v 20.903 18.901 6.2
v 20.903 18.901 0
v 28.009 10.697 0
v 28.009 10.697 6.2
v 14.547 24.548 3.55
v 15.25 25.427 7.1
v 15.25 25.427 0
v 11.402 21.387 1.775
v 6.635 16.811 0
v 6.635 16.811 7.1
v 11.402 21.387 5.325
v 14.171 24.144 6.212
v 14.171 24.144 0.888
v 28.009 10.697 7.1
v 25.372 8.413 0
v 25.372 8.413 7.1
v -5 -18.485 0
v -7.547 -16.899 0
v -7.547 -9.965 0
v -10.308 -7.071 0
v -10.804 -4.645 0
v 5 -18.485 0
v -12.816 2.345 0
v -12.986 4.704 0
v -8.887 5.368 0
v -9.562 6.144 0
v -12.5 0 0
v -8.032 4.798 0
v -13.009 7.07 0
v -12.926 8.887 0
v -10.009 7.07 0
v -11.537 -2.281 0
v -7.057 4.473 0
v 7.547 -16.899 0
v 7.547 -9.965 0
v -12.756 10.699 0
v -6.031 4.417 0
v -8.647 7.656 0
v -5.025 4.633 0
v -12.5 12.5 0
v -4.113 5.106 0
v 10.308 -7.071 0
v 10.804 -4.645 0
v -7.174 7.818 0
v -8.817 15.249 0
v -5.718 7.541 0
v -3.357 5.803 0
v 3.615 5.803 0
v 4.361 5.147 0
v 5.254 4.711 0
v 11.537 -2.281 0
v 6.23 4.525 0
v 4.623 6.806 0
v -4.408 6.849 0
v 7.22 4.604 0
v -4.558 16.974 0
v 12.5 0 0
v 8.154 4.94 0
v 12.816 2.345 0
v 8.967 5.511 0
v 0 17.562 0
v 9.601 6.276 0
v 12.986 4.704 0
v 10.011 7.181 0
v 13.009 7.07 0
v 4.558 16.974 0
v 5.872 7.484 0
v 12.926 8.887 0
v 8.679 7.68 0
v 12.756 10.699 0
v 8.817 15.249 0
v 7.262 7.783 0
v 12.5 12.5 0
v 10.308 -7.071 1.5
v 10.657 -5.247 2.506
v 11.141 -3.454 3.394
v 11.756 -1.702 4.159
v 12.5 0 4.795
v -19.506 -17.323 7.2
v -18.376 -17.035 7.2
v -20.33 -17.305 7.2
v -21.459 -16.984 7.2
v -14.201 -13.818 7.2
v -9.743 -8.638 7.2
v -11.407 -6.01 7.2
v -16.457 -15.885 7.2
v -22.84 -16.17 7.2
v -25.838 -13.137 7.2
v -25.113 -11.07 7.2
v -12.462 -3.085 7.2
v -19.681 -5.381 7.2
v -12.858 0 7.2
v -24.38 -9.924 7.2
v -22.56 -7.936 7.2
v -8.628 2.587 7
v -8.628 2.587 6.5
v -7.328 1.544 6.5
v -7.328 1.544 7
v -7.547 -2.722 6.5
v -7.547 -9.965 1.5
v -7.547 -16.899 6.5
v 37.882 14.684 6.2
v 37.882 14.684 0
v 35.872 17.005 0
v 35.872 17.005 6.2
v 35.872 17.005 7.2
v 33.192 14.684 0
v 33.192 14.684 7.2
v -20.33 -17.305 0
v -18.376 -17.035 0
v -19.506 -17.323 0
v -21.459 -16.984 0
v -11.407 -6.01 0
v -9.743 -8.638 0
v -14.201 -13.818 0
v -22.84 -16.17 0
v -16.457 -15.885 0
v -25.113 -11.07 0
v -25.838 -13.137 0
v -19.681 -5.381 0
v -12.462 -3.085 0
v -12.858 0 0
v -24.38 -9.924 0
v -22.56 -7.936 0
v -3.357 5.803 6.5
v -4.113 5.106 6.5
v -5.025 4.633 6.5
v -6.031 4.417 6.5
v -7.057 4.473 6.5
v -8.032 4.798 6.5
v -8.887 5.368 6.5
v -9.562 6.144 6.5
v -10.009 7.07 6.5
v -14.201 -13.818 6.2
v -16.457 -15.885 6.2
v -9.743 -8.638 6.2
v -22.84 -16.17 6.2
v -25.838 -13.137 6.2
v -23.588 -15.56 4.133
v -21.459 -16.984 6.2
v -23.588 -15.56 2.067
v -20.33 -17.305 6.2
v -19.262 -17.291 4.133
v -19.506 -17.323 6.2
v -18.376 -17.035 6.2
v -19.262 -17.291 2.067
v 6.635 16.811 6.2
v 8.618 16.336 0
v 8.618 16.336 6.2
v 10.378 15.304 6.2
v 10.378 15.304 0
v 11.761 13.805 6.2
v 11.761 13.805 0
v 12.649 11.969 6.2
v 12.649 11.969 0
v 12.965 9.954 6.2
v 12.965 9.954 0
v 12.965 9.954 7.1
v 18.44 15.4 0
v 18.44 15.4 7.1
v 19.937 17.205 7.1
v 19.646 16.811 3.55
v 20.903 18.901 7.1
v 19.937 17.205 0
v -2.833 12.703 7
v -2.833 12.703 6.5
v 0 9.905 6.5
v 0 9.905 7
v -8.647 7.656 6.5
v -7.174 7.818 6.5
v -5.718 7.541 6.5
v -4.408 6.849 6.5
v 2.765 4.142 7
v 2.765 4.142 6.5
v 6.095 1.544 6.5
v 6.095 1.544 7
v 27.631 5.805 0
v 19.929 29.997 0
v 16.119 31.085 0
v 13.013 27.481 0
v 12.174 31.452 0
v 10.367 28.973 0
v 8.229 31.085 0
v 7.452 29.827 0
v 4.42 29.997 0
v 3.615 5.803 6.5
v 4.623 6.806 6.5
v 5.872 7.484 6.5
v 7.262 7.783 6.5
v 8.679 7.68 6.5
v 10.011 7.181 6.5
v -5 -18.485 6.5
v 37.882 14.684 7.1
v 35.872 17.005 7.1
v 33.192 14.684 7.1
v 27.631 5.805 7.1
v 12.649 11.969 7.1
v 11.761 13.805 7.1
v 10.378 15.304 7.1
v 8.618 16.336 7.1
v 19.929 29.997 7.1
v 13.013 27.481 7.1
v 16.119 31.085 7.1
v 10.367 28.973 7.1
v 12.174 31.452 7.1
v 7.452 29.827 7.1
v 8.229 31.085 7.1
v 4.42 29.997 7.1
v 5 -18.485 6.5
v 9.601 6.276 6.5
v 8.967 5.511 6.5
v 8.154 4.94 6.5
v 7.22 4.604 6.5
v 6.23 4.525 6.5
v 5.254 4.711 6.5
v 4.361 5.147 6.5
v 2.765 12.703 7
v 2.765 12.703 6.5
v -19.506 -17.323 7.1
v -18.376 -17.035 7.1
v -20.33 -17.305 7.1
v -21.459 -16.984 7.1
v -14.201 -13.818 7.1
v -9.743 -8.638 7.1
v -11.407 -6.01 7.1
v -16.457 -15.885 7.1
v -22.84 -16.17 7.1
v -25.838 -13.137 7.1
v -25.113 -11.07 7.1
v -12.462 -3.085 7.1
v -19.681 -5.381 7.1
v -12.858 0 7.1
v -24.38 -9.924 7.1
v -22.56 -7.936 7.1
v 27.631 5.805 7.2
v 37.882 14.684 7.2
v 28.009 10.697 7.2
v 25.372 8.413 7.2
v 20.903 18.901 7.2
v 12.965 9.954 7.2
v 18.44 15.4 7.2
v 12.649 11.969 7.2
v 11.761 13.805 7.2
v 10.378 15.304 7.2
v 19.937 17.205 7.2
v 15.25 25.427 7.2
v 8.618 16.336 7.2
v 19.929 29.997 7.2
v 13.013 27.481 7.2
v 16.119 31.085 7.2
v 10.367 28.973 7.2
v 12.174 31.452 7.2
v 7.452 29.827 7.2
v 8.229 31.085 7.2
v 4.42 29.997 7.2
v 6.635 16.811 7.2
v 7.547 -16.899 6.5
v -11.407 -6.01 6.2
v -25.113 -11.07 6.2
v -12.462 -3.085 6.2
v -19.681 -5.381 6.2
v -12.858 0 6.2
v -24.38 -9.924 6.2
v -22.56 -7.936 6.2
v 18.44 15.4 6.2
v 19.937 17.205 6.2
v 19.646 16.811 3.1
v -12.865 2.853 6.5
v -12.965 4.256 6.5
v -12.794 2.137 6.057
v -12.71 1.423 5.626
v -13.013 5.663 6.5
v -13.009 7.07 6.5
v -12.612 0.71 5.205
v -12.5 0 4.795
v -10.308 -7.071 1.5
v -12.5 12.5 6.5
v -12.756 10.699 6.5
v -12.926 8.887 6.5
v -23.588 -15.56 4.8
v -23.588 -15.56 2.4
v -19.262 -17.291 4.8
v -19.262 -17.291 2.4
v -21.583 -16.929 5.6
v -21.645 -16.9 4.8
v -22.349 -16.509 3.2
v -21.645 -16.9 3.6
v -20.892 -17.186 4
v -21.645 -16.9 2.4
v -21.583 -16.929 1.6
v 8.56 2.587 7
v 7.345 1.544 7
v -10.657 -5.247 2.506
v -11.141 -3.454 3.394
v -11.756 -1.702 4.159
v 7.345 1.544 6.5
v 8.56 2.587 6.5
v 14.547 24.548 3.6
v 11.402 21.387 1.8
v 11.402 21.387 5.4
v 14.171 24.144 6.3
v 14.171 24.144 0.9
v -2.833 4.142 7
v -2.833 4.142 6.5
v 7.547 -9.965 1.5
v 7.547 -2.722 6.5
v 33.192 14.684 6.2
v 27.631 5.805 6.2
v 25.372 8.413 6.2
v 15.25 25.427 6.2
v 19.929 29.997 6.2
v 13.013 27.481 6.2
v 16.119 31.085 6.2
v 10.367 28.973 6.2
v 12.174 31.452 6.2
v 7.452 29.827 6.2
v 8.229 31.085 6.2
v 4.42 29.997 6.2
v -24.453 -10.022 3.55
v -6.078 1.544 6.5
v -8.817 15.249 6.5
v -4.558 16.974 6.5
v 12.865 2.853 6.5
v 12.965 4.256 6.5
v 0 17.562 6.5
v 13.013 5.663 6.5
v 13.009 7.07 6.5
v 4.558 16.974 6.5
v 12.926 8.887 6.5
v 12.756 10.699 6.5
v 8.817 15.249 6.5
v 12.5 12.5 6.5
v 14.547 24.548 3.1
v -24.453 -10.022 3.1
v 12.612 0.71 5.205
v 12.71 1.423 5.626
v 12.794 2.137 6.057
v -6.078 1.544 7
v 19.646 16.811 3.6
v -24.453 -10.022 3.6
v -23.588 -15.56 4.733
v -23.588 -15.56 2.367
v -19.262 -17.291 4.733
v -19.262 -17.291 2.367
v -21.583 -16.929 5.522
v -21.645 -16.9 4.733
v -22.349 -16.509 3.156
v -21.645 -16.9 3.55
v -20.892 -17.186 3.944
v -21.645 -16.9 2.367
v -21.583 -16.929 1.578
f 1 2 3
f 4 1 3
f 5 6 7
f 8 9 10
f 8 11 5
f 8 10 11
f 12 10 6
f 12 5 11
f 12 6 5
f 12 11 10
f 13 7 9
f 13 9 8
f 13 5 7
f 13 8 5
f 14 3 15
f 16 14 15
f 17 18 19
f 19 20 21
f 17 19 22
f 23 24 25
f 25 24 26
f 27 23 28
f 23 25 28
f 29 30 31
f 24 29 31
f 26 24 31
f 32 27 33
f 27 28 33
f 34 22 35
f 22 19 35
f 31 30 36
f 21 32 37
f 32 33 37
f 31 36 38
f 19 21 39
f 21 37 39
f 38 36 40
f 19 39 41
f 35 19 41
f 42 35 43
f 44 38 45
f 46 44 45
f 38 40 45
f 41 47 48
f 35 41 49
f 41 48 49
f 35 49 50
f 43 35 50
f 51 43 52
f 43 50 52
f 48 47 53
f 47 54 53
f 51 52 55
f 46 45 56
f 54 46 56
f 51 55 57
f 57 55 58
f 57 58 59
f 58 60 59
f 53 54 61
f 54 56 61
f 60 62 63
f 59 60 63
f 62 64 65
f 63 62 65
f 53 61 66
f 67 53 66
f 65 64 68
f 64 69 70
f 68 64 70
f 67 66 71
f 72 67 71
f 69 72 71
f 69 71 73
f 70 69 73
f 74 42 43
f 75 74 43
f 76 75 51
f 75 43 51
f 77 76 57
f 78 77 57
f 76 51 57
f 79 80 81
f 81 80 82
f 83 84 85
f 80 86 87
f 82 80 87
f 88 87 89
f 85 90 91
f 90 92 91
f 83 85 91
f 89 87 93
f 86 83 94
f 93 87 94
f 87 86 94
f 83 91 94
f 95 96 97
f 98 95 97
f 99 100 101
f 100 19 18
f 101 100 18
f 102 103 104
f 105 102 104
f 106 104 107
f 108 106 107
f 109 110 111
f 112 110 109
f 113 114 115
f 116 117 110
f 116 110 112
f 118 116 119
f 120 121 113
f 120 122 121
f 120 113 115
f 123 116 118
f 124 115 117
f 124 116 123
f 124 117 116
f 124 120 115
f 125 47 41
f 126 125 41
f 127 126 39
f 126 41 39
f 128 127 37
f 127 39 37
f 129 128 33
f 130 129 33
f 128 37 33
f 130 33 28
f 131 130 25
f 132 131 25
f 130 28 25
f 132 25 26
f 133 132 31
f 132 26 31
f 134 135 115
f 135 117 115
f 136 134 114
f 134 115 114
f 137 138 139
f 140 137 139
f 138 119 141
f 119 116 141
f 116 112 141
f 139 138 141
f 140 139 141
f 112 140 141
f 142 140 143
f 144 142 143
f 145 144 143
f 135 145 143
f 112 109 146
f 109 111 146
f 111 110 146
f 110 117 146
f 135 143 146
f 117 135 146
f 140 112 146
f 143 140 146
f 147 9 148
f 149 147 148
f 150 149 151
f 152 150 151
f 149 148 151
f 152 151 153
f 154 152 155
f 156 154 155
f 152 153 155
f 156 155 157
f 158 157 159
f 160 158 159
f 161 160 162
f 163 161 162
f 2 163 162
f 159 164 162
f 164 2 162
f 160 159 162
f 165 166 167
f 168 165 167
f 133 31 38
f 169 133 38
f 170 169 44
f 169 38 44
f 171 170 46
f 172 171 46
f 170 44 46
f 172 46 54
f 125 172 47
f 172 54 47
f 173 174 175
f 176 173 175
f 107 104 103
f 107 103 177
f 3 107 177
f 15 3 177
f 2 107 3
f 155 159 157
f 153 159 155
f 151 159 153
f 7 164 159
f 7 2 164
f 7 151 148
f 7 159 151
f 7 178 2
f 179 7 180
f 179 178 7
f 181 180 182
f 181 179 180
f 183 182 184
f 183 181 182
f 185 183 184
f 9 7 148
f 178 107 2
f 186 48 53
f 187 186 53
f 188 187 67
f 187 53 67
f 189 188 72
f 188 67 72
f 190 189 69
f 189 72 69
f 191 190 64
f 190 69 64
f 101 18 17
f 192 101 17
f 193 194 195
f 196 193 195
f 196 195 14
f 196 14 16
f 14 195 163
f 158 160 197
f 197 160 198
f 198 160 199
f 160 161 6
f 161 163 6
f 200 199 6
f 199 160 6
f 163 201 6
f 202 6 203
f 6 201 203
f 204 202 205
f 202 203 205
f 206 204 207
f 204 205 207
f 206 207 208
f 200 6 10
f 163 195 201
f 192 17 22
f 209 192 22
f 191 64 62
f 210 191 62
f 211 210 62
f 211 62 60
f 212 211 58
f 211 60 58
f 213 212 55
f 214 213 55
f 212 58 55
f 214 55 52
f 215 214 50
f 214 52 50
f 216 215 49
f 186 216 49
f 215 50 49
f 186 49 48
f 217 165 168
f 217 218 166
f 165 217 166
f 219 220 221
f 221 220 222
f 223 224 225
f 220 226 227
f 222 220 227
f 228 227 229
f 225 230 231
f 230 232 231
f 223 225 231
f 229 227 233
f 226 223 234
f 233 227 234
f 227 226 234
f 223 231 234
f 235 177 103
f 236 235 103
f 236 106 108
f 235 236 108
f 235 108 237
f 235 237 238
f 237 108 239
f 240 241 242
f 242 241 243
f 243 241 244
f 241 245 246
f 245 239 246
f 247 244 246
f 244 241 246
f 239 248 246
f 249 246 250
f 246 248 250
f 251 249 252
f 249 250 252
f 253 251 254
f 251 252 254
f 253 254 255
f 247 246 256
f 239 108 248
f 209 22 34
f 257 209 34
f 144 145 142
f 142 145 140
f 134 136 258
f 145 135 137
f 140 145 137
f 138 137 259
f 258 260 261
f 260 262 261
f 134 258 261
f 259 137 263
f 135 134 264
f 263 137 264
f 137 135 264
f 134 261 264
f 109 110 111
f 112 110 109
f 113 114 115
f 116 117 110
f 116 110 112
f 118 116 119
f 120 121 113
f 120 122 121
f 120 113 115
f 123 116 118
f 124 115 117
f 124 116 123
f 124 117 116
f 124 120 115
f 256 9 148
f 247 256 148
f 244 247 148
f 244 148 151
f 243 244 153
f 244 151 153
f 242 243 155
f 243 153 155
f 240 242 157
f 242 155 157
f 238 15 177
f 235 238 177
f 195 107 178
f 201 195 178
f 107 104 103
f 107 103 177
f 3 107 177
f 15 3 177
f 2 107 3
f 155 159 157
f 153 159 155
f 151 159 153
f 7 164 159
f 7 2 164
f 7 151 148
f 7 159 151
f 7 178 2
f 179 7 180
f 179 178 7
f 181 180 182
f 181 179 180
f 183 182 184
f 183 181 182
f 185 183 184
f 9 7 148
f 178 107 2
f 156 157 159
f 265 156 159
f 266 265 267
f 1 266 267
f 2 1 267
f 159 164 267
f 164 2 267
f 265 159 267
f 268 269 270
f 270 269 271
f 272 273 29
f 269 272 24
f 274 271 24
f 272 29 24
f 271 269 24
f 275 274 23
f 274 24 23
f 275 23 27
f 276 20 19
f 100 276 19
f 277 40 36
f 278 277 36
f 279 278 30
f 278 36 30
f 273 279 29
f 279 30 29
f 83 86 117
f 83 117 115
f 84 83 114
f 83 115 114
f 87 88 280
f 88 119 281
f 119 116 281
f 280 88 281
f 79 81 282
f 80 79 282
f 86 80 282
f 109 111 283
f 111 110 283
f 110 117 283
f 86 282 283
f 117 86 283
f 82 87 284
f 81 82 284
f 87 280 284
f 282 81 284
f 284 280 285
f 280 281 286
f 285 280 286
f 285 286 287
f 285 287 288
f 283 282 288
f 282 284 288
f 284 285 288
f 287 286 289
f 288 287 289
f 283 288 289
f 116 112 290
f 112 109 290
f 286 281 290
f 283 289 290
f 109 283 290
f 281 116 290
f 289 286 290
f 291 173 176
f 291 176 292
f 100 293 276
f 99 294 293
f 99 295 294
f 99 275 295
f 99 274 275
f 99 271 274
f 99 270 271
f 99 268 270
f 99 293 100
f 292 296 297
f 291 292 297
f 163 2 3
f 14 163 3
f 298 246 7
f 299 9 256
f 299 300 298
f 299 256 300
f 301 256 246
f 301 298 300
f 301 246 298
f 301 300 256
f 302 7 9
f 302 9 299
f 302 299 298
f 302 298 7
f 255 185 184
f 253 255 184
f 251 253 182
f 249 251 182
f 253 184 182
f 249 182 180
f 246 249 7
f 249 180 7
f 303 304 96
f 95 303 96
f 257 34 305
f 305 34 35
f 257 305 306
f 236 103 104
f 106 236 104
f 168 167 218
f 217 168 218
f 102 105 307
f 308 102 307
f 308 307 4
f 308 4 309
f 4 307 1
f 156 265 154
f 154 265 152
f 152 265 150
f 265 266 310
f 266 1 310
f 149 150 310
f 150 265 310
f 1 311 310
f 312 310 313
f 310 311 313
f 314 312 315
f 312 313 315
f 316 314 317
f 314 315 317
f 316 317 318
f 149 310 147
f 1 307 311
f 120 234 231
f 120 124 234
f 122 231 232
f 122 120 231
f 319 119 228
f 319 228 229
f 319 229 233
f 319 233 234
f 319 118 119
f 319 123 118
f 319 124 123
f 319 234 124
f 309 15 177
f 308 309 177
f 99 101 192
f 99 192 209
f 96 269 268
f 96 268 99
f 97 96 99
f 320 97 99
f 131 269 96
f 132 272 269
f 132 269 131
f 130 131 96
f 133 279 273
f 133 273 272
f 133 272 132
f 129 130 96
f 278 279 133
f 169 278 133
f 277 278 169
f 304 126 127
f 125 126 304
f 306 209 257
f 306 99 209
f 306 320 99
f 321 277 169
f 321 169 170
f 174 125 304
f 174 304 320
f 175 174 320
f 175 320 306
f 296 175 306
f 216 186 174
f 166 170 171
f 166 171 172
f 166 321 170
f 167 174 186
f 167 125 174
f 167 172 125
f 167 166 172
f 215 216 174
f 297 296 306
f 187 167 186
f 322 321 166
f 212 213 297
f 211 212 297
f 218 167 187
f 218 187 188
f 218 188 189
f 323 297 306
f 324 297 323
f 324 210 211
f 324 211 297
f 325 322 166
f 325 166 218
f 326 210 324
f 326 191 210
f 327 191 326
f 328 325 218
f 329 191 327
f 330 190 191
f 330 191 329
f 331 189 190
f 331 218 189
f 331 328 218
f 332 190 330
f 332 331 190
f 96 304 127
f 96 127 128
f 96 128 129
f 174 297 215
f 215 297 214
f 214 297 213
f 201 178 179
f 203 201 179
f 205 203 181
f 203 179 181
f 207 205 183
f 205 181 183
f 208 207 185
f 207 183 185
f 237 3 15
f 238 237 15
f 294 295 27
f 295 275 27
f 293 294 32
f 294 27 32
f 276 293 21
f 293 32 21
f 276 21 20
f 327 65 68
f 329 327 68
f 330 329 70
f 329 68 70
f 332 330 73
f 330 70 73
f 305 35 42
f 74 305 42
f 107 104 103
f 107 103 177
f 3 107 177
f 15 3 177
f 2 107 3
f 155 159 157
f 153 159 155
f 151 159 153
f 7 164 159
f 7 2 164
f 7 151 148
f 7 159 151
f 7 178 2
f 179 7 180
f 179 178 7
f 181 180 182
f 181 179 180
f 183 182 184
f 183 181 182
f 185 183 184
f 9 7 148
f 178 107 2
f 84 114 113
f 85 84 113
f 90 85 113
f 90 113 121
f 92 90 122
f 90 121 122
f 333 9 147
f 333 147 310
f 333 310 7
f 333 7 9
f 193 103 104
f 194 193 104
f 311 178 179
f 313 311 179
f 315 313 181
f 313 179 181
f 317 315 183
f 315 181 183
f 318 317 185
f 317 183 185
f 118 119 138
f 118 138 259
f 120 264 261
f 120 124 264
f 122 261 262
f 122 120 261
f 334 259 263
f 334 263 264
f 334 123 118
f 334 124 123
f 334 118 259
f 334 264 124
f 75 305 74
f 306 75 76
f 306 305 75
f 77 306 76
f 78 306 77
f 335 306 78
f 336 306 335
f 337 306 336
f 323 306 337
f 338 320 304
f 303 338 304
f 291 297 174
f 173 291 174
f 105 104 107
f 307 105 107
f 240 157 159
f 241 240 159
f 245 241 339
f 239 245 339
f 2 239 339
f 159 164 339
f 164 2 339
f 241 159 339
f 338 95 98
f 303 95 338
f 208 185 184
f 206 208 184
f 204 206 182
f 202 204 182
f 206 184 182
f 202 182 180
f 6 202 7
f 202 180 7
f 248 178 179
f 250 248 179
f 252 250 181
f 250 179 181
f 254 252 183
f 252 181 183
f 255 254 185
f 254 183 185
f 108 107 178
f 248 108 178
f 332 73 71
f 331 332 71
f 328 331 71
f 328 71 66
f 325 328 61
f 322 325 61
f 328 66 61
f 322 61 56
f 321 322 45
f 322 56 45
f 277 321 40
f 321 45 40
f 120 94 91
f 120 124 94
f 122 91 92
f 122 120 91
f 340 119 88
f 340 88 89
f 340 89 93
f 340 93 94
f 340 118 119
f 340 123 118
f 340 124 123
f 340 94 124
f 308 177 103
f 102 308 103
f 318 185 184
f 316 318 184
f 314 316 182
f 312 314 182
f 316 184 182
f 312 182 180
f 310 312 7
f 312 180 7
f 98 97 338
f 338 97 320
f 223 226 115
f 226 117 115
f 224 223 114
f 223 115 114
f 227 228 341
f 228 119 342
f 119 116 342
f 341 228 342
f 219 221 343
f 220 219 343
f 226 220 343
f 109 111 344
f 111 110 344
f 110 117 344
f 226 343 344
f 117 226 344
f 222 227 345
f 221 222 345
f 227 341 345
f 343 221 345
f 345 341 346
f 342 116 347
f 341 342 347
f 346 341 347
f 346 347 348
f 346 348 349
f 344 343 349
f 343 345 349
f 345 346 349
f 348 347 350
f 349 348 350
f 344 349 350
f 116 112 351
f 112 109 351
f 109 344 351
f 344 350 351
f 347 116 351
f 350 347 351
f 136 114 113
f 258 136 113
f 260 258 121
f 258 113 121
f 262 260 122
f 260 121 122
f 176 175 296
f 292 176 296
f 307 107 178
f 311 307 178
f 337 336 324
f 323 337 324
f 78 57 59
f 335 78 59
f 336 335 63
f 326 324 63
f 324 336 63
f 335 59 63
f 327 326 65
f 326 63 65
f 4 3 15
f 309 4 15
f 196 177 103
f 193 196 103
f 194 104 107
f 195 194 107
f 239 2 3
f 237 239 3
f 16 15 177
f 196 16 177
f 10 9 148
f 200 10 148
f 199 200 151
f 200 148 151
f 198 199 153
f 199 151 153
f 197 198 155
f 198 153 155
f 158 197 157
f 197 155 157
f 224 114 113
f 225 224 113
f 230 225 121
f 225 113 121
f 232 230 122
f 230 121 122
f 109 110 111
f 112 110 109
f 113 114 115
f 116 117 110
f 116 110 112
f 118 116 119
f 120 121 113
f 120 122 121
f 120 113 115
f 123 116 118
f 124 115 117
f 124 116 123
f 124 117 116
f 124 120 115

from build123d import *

# Parameters (mm, degrees)
F1_DEPTH = 6.5
F3_SIZE  = 5
F4_DEPTH = 7
F6_DEPTH = 7.2
F7_DEPTH = 7.1
F8_DEPTH = 6.2


with BuildPart() as f1:
    # F0 (on Top) → F1 (new body)
    with BuildSketch(Plane.XY):
        with BuildLine():
            Line((-5, -18.4848460191), (0, -18.4848460191))
            Line((0, -18.4848460191), (5, -18.4848460191))
            Line((5, -18.4848460191), (7.546688482, -16.8991670555))
            Line((7.546688482, -16.8991670555), (7.546688482, -9.9648127406))
            Line((7.546688482, -9.9648127406), (10.307957616, -7.0707856555))
            ThreePointArc((10.307957616, -7.0707856555), (11.1408114989, -3.4538072836), (12.5, 0))
            ThreePointArc((12.5, 0), (12.9195363206, 3.5231057176), (13.0086560419, 7.0699835415))
            Line((13.0086560419, 7.0699835415), (10.0107151117, 7.1811149009))
            ThreePointArc((10.0107151117, 7.1811149009), (7.2198051274, 4.6037186851), (3.6151232198, 5.803059395))
            Line((3.6151232198, 5.803059395), (-3.3572988263, 5.803059395))
            ThreePointArc((-3.3572988263, 5.803059395), (-7.0569417695, 4.4732070993), (-10.0086560419, 7.0699835415))
            Line((-10.0086560419, 7.0699835415), (-13.0086560419, 7.0699835415))
            ThreePointArc((-13.0086560419, 7.0699835415), (-12.9195363206, 3.5231057176), (-12.5, 0))
            ThreePointArc((-12.5, 0), (-11.1408114989, -3.4538072836), (-10.307957616, -7.0707856555))
            Line((-10.307957616, -7.0707856555), (-7.546688482, -9.9648127406))
            Line((-7.546688482, -9.9648127406), (-7.546688482, -16.8991670555))
            Line((-7.546688482, -16.8991670555), (-5, -18.4848460191))
        make_face()
        with BuildLine():
            ThreePointArc((-12.5, 12.5), (-12.8518687613, 9.7941288861), (-13.0086560419, 7.0699835415))
            Line((-13.0086560419, 7.0699835415), (-10.0086560419, 7.0699835415))
            ThreePointArc((-10.0086560419, 7.0699835415), (-6.435892718, 7.7337172897), (-3.3572988263, 5.803059395))
            Line((-3.3572988263, 5.803059395), (3.6151232198, 5.803059395))
            ThreePointArc((3.6151232198, 5.803059395), (6.5562487153, 7.6833014675), (10.0107151117, 7.1811149009))
            Line((10.0107151117, 7.1811149009), (13.0086560419, 7.0699835415))
            ThreePointArc((13.0086560419, 7.0699835415), (12.8518687613, 9.7941288861), (12.5, 12.5))
            ThreePointArc((12.5, 12.5), (0, 17.5620218672), (-12.5, 12.5))
        make_face()
    extrude(amount=F1_DEPTH)

    # F3
    f3_edges = [f1.edges().sort_by_distance(p)[0] for p in [
        (-8.927323, -8.517799, 6.5),
        (8.927323, -8.517799, 6.5),
    ]]
    chamfer(f3_edges, length=F3_SIZE)

    # F2 (on Top) → F4 (join)
    with BuildSketch(Plane.XY):
        Polygon((2.7648685425, 12.7032707048), (0, 12.7032707048), (-2.8330716532, 12.7032707048), (0, 9.9045083547), align=None)
        Polygon((-7.3284250684, 1.5438316623), (-2.8330716532, 4.1420751754), (-8.6280779543, 2.5871147354), align=None)
        Polygon((-6.0784250684, 1.5438316623), (-2.8330716532, 4.1420751754), (-7.3284250684, 1.5438316623), align=None)
        Polygon((8.5598748436, 2.5871147354), (2.7648685425, 4.1420751754), (7.3452845961, 1.5438316623), align=None)
        Polygon((7.3452845961, 1.5438316623), (2.7648685425, 4.1420751754), (6.0952845961, 1.5438316623), align=None)
    extrude(amount=F4_DEPTH)


with BuildPart() as f6:
    # F5 (on Top) → F6 (new body)
    with BuildSketch(Plane.XY):
        with BuildLine():
            add(Edge.make_bspline(
                [(-25.8379075676, -13.1371738389), (-25.5945488681, -12.1848880245), (-24.8351838835, -9.213420376), (-17.7041135385, -3.727685368), (-12.8583842888, 0)],
                knots=[0, 0, 0, 0, 0.3204765883, 1, 1, 1, 1], degree=3))
            add(Edge.make_bspline(
                [(-25.8379075676, -13.1371738389), (-25.1821435427, -13.9341154603), (-23.7478790856, -15.6771586869), (-18.4500778378, -19.2834477125), (-13.0896551761, -12.7292205484), (-9.7432984039, -8.6376061663)],
                knots=[0, 0, 0, 0, 0.2404058287, 0.5258073365, 1, 1, 1, 1], degree=3))
            ThreePointArc((-9.7432984039, -8.6376061663), (-12.0142304981, -4.5760813654), (-12.8583842888, 0))
        make_face()
    extrude(amount=F6_DEPTH)


with BuildPart() as f6b:
    # F5 (on Top) → F6, piece 2 (new body)
    with BuildSketch(Plane.XY):
        with BuildLine():
            add(Edge.make_bspline(
                [(6.6346595995, 16.8111696839), (9.9933228586, 20.0193486711), (14.4232862269, 24.2508283688), (15.0893225263, 25.1978767297), (15.2503903955, 25.4269018769)],
                knots=[0, 0, 0, 0, 0.7581695332, 1, 1, 1, 1], degree=3))
            ThreePointArc((6.6346595995, 16.8111696839), (11.1249930464, 14.6058795236), (12.964585796, 9.9537512287))
            add(Edge.make_bspline(
                [(12.964585796, 9.9537512287), (15.655198787, 12.5387803888), (19.6988329208, 16.4237360414), (20.6024271345, 18.2812074964), (20.9025796213, 18.9013099688)],
                knots=[0, 0, 0, 0, 0.6639989533, 0.9979022778, 0.9979022778, 0.9979022778, 0.9979022778], degree=3))
            Line((20.9025796213, 18.9013099688), (15.2503903955, 25.4269018769))
        make_face()
        with BuildLine():
            Line((20.9082365036, 18.9129970968), (15.2503903955, 25.4269018769))
            Line((15.2503903955, 25.4269018769), (20.9025796213, 18.9013099688))
            add(Edge.make_bspline(
                [(20.9025796213, 18.9013099688), (20.9044653065, 18.9052057154), (20.9063509051, 18.9091014061), (20.9082365036, 18.9129970968)],
                knots=[0.9979022778, 0.9979022778, 0.9979022778, 0.9979022778, 1, 1, 1, 1], degree=3))
        make_face()
        with BuildLine():
            ThreePointArc((4.4197016396, 29.9974143004), (10.3673193121, 28.9734797637), (15.2503903955, 25.4269018769))
            Line((15.2503903955, 25.4269018769), (20.9082365036, 18.9129970968))
            add(Edge.make_bspline(
                [(20.9025796213, 18.9013099688), (20.9044653065, 18.9052057154), (20.9063509051, 18.9091014061), (20.9082365036, 18.9129970968)],
                knots=[0.9979022778, 0.9979022778, 0.9979022778, 0.9979022778, 1, 1, 1, 1], degree=3))
            Line((20.9025796213, 18.9013099688), (28.008563444, 10.6972763315))
            Line((28.008563444, 10.6972763315), (25.3717325873, 8.4133659723))
            Line((25.3717325873, 8.4133659723), (27.6311614719, 5.8047995819))
            Line((27.6311614719, 5.8047995819), (37.8823381157, 14.6839313133))
            Line((37.8823381157, 14.6839313133), (35.8720388572, 17.004871404))
            Line((35.8720388572, 17.004871404), (33.1924562619, 14.6839313133))
            Line((33.1924562619, 14.6839313133), (19.928570814, 29.9974143004))
            ThreePointArc((19.928570814, 29.9974143004), (12.1741362268, 31.4518374404), (4.4197016396, 29.9974143004))
        make_face()
    extrude(amount=F6_DEPTH)


with BuildPart() as f7:
    # F5 (on Top) → F7 (new body)
    with BuildSketch(Plane.XY):
        with BuildLine():
            add(Edge.make_bspline(
                [(-25.8379075676, -13.1371738389), (-25.5945488681, -12.1848880245), (-24.8351838835, -9.213420376), (-17.7041135385, -3.727685368), (-12.8583842888, 0)],
                knots=[0, 0, 0, 0, 0.3204765883, 1, 1, 1, 1], degree=3))
            add(Edge.make_bspline(
                [(-25.8379075676, -13.1371738389), (-25.1821435427, -13.9341154603), (-23.7478790856, -15.6771586869), (-18.4500778378, -19.2834477125), (-13.0896551761, -12.7292205484), (-9.7432984039, -8.6376061663)],
                knots=[0, 0, 0, 0, 0.2404058287, 0.5258073365, 1, 1, 1, 1], degree=3))
            ThreePointArc((-9.7432984039, -8.6376061663), (-12.0142304981, -4.5760813654), (-12.8583842888, 0))
        make_face()
    extrude(amount=F7_DEPTH)


with BuildPart() as f7b:
    # F5 (on Top) → F7, piece 2 (new body)
    with BuildSketch(Plane.XY):
        with BuildLine():
            add(Edge.make_bspline(
                [(6.6346595995, 16.8111696839), (9.9933228586, 20.0193486711), (14.4232862269, 24.2508283688), (15.0893225263, 25.1978767297), (15.2503903955, 25.4269018769)],
                knots=[0, 0, 0, 0, 0.7581695332, 1, 1, 1, 1], degree=3))
            ThreePointArc((6.6346595995, 16.8111696839), (11.1249930464, 14.6058795236), (12.964585796, 9.9537512287))
            add(Edge.make_bspline(
                [(12.964585796, 9.9537512287), (15.655198787, 12.5387803888), (19.6988329208, 16.4237360414), (20.6024271345, 18.2812074964), (20.9025796213, 18.9013099688)],
                knots=[0, 0, 0, 0, 0.6639989533, 0.9979022778, 0.9979022778, 0.9979022778, 0.9979022778], degree=3))
            Line((20.9025796213, 18.9013099688), (15.2503903955, 25.4269018769))
        make_face()
        with BuildLine():
            Line((20.9082365036, 18.9129970968), (15.2503903955, 25.4269018769))
            Line((15.2503903955, 25.4269018769), (20.9025796213, 18.9013099688))
            add(Edge.make_bspline(
                [(20.9025796213, 18.9013099688), (20.9044653065, 18.9052057154), (20.9063509051, 18.9091014061), (20.9082365036, 18.9129970968)],
                knots=[0.9979022778, 0.9979022778, 0.9979022778, 0.9979022778, 1, 1, 1, 1], degree=3))
        make_face()
        with BuildLine():
            ThreePointArc((4.4197016396, 29.9974143004), (10.3673193121, 28.9734797637), (15.2503903955, 25.4269018769))
            Line((15.2503903955, 25.4269018769), (20.9082365036, 18.9129970968))
            add(Edge.make_bspline(
                [(20.9025796213, 18.9013099688), (20.9044653065, 18.9052057154), (20.9063509051, 18.9091014061), (20.9082365036, 18.9129970968)],
                knots=[0.9979022778, 0.9979022778, 0.9979022778, 0.9979022778, 1, 1, 1, 1], degree=3))
            Line((20.9025796213, 18.9013099688), (28.008563444, 10.6972763315))
            Line((28.008563444, 10.6972763315), (25.3717325873, 8.4133659723))
            Line((25.3717325873, 8.4133659723), (27.6311614719, 5.8047995819))
            Line((27.6311614719, 5.8047995819), (37.8823381157, 14.6839313133))
            Line((37.8823381157, 14.6839313133), (35.8720388572, 17.004871404))
            Line((35.8720388572, 17.004871404), (33.1924562619, 14.6839313133))
            Line((33.1924562619, 14.6839313133), (19.928570814, 29.9974143004))
            ThreePointArc((19.928570814, 29.9974143004), (12.1741362268, 31.4518374404), (4.4197016396, 29.9974143004))
        make_face()
    extrude(amount=F7_DEPTH)


with BuildPart() as f8:
    # F5 (on Top) → F8 (new body)
    with BuildSketch(Plane.XY):
        with BuildLine():
            add(Edge.make_bspline(
                [(-25.8379075676, -13.1371738389), (-25.5945488681, -12.1848880245), (-24.8351838835, -9.213420376), (-17.7041135385, -3.727685368), (-12.8583842888, 0)],
                knots=[0, 0, 0, 0, 0.3204765883, 1, 1, 1, 1], degree=3))
            add(Edge.make_bspline(
                [(-25.8379075676, -13.1371738389), (-25.1821435427, -13.9341154603), (-23.7478790856, -15.6771586869), (-18.4500778378, -19.2834477125), (-13.0896551761, -12.7292205484), (-9.7432984039, -8.6376061663)],
                knots=[0, 0, 0, 0, 0.2404058287, 0.5258073365, 1, 1, 1, 1], degree=3))
            ThreePointArc((-9.7432984039, -8.6376061663), (-12.0142304981, -4.5760813654), (-12.8583842888, 0))
        make_face()
    extrude(amount=F8_DEPTH)


with BuildPart() as f8b:
    # F5 (on Top) → F8, piece 2 (new body)
    with BuildSketch(Plane.XY):
        with BuildLine():
            add(Edge.make_bspline(
                [(6.6346595995, 16.8111696839), (9.9933228586, 20.0193486711), (14.4232862269, 24.2508283688), (15.0893225263, 25.1978767297), (15.2503903955, 25.4269018769)],
                knots=[0, 0, 0, 0, 0.7581695332, 1, 1, 1, 1], degree=3))
            ThreePointArc((6.6346595995, 16.8111696839), (11.1249930464, 14.6058795236), (12.964585796, 9.9537512287))
            add(Edge.make_bspline(
                [(12.964585796, 9.9537512287), (15.655198787, 12.5387803888), (19.6988329208, 16.4237360414), (20.6024271345, 18.2812074964), (20.9025796213, 18.9013099688)],
                knots=[0, 0, 0, 0, 0.6639989533, 0.9979022778, 0.9979022778, 0.9979022778, 0.9979022778], degree=3))
            Line((20.9025796213, 18.9013099688), (15.2503903955, 25.4269018769))
        make_face()
        with BuildLine():
            Line((20.9082365036, 18.9129970968), (15.2503903955, 25.4269018769))
            Line((15.2503903955, 25.4269018769), (20.9025796213, 18.9013099688))
            add(Edge.make_bspline(
                [(20.9025796213, 18.9013099688), (20.9044653065, 18.9052057154), (20.9063509051, 18.9091014061), (20.9082365036, 18.9129970968)],
                knots=[0.9979022778, 0.9979022778, 0.9979022778, 0.9979022778, 1, 1, 1, 1], degree=3))
        make_face()
        with BuildLine():
            ThreePointArc((4.4197016396, 29.9974143004), (10.3673193121, 28.9734797637), (15.2503903955, 25.4269018769))
            Line((15.2503903955, 25.4269018769), (20.9082365036, 18.9129970968))
            add(Edge.make_bspline(
                [(20.9025796213, 18.9013099688), (20.9044653065, 18.9052057154), (20.9063509051, 18.9091014061), (20.9082365036, 18.9129970968)],
                knots=[0.9979022778, 0.9979022778, 0.9979022778, 0.9979022778, 1, 1, 1, 1], degree=3))
            Line((20.9025796213, 18.9013099688), (28.008563444, 10.6972763315))
            Line((28.008563444, 10.6972763315), (25.3717325873, 8.4133659723))
            Line((25.3717325873, 8.4133659723), (27.6311614719, 5.8047995819))
            Line((27.6311614719, 5.8047995819), (37.8823381157, 14.6839313133))
            Line((37.8823381157, 14.6839313133), (35.8720388572, 17.004871404))
            Line((35.8720388572, 17.004871404), (33.1924562619, 14.6839313133))
            Line((33.1924562619, 14.6839313133), (19.928570814, 29.9974143004))
            ThreePointArc((19.928570814, 29.9974143004), (12.1741362268, 31.4518374404), (4.4197016396, 29.9974143004))
        make_face()
    extrude(amount=F8_DEPTH)


solid = Compound([f1.part, f6.part, f6b.part, f7.part, f7b.part, f8.part, f8b.part])
